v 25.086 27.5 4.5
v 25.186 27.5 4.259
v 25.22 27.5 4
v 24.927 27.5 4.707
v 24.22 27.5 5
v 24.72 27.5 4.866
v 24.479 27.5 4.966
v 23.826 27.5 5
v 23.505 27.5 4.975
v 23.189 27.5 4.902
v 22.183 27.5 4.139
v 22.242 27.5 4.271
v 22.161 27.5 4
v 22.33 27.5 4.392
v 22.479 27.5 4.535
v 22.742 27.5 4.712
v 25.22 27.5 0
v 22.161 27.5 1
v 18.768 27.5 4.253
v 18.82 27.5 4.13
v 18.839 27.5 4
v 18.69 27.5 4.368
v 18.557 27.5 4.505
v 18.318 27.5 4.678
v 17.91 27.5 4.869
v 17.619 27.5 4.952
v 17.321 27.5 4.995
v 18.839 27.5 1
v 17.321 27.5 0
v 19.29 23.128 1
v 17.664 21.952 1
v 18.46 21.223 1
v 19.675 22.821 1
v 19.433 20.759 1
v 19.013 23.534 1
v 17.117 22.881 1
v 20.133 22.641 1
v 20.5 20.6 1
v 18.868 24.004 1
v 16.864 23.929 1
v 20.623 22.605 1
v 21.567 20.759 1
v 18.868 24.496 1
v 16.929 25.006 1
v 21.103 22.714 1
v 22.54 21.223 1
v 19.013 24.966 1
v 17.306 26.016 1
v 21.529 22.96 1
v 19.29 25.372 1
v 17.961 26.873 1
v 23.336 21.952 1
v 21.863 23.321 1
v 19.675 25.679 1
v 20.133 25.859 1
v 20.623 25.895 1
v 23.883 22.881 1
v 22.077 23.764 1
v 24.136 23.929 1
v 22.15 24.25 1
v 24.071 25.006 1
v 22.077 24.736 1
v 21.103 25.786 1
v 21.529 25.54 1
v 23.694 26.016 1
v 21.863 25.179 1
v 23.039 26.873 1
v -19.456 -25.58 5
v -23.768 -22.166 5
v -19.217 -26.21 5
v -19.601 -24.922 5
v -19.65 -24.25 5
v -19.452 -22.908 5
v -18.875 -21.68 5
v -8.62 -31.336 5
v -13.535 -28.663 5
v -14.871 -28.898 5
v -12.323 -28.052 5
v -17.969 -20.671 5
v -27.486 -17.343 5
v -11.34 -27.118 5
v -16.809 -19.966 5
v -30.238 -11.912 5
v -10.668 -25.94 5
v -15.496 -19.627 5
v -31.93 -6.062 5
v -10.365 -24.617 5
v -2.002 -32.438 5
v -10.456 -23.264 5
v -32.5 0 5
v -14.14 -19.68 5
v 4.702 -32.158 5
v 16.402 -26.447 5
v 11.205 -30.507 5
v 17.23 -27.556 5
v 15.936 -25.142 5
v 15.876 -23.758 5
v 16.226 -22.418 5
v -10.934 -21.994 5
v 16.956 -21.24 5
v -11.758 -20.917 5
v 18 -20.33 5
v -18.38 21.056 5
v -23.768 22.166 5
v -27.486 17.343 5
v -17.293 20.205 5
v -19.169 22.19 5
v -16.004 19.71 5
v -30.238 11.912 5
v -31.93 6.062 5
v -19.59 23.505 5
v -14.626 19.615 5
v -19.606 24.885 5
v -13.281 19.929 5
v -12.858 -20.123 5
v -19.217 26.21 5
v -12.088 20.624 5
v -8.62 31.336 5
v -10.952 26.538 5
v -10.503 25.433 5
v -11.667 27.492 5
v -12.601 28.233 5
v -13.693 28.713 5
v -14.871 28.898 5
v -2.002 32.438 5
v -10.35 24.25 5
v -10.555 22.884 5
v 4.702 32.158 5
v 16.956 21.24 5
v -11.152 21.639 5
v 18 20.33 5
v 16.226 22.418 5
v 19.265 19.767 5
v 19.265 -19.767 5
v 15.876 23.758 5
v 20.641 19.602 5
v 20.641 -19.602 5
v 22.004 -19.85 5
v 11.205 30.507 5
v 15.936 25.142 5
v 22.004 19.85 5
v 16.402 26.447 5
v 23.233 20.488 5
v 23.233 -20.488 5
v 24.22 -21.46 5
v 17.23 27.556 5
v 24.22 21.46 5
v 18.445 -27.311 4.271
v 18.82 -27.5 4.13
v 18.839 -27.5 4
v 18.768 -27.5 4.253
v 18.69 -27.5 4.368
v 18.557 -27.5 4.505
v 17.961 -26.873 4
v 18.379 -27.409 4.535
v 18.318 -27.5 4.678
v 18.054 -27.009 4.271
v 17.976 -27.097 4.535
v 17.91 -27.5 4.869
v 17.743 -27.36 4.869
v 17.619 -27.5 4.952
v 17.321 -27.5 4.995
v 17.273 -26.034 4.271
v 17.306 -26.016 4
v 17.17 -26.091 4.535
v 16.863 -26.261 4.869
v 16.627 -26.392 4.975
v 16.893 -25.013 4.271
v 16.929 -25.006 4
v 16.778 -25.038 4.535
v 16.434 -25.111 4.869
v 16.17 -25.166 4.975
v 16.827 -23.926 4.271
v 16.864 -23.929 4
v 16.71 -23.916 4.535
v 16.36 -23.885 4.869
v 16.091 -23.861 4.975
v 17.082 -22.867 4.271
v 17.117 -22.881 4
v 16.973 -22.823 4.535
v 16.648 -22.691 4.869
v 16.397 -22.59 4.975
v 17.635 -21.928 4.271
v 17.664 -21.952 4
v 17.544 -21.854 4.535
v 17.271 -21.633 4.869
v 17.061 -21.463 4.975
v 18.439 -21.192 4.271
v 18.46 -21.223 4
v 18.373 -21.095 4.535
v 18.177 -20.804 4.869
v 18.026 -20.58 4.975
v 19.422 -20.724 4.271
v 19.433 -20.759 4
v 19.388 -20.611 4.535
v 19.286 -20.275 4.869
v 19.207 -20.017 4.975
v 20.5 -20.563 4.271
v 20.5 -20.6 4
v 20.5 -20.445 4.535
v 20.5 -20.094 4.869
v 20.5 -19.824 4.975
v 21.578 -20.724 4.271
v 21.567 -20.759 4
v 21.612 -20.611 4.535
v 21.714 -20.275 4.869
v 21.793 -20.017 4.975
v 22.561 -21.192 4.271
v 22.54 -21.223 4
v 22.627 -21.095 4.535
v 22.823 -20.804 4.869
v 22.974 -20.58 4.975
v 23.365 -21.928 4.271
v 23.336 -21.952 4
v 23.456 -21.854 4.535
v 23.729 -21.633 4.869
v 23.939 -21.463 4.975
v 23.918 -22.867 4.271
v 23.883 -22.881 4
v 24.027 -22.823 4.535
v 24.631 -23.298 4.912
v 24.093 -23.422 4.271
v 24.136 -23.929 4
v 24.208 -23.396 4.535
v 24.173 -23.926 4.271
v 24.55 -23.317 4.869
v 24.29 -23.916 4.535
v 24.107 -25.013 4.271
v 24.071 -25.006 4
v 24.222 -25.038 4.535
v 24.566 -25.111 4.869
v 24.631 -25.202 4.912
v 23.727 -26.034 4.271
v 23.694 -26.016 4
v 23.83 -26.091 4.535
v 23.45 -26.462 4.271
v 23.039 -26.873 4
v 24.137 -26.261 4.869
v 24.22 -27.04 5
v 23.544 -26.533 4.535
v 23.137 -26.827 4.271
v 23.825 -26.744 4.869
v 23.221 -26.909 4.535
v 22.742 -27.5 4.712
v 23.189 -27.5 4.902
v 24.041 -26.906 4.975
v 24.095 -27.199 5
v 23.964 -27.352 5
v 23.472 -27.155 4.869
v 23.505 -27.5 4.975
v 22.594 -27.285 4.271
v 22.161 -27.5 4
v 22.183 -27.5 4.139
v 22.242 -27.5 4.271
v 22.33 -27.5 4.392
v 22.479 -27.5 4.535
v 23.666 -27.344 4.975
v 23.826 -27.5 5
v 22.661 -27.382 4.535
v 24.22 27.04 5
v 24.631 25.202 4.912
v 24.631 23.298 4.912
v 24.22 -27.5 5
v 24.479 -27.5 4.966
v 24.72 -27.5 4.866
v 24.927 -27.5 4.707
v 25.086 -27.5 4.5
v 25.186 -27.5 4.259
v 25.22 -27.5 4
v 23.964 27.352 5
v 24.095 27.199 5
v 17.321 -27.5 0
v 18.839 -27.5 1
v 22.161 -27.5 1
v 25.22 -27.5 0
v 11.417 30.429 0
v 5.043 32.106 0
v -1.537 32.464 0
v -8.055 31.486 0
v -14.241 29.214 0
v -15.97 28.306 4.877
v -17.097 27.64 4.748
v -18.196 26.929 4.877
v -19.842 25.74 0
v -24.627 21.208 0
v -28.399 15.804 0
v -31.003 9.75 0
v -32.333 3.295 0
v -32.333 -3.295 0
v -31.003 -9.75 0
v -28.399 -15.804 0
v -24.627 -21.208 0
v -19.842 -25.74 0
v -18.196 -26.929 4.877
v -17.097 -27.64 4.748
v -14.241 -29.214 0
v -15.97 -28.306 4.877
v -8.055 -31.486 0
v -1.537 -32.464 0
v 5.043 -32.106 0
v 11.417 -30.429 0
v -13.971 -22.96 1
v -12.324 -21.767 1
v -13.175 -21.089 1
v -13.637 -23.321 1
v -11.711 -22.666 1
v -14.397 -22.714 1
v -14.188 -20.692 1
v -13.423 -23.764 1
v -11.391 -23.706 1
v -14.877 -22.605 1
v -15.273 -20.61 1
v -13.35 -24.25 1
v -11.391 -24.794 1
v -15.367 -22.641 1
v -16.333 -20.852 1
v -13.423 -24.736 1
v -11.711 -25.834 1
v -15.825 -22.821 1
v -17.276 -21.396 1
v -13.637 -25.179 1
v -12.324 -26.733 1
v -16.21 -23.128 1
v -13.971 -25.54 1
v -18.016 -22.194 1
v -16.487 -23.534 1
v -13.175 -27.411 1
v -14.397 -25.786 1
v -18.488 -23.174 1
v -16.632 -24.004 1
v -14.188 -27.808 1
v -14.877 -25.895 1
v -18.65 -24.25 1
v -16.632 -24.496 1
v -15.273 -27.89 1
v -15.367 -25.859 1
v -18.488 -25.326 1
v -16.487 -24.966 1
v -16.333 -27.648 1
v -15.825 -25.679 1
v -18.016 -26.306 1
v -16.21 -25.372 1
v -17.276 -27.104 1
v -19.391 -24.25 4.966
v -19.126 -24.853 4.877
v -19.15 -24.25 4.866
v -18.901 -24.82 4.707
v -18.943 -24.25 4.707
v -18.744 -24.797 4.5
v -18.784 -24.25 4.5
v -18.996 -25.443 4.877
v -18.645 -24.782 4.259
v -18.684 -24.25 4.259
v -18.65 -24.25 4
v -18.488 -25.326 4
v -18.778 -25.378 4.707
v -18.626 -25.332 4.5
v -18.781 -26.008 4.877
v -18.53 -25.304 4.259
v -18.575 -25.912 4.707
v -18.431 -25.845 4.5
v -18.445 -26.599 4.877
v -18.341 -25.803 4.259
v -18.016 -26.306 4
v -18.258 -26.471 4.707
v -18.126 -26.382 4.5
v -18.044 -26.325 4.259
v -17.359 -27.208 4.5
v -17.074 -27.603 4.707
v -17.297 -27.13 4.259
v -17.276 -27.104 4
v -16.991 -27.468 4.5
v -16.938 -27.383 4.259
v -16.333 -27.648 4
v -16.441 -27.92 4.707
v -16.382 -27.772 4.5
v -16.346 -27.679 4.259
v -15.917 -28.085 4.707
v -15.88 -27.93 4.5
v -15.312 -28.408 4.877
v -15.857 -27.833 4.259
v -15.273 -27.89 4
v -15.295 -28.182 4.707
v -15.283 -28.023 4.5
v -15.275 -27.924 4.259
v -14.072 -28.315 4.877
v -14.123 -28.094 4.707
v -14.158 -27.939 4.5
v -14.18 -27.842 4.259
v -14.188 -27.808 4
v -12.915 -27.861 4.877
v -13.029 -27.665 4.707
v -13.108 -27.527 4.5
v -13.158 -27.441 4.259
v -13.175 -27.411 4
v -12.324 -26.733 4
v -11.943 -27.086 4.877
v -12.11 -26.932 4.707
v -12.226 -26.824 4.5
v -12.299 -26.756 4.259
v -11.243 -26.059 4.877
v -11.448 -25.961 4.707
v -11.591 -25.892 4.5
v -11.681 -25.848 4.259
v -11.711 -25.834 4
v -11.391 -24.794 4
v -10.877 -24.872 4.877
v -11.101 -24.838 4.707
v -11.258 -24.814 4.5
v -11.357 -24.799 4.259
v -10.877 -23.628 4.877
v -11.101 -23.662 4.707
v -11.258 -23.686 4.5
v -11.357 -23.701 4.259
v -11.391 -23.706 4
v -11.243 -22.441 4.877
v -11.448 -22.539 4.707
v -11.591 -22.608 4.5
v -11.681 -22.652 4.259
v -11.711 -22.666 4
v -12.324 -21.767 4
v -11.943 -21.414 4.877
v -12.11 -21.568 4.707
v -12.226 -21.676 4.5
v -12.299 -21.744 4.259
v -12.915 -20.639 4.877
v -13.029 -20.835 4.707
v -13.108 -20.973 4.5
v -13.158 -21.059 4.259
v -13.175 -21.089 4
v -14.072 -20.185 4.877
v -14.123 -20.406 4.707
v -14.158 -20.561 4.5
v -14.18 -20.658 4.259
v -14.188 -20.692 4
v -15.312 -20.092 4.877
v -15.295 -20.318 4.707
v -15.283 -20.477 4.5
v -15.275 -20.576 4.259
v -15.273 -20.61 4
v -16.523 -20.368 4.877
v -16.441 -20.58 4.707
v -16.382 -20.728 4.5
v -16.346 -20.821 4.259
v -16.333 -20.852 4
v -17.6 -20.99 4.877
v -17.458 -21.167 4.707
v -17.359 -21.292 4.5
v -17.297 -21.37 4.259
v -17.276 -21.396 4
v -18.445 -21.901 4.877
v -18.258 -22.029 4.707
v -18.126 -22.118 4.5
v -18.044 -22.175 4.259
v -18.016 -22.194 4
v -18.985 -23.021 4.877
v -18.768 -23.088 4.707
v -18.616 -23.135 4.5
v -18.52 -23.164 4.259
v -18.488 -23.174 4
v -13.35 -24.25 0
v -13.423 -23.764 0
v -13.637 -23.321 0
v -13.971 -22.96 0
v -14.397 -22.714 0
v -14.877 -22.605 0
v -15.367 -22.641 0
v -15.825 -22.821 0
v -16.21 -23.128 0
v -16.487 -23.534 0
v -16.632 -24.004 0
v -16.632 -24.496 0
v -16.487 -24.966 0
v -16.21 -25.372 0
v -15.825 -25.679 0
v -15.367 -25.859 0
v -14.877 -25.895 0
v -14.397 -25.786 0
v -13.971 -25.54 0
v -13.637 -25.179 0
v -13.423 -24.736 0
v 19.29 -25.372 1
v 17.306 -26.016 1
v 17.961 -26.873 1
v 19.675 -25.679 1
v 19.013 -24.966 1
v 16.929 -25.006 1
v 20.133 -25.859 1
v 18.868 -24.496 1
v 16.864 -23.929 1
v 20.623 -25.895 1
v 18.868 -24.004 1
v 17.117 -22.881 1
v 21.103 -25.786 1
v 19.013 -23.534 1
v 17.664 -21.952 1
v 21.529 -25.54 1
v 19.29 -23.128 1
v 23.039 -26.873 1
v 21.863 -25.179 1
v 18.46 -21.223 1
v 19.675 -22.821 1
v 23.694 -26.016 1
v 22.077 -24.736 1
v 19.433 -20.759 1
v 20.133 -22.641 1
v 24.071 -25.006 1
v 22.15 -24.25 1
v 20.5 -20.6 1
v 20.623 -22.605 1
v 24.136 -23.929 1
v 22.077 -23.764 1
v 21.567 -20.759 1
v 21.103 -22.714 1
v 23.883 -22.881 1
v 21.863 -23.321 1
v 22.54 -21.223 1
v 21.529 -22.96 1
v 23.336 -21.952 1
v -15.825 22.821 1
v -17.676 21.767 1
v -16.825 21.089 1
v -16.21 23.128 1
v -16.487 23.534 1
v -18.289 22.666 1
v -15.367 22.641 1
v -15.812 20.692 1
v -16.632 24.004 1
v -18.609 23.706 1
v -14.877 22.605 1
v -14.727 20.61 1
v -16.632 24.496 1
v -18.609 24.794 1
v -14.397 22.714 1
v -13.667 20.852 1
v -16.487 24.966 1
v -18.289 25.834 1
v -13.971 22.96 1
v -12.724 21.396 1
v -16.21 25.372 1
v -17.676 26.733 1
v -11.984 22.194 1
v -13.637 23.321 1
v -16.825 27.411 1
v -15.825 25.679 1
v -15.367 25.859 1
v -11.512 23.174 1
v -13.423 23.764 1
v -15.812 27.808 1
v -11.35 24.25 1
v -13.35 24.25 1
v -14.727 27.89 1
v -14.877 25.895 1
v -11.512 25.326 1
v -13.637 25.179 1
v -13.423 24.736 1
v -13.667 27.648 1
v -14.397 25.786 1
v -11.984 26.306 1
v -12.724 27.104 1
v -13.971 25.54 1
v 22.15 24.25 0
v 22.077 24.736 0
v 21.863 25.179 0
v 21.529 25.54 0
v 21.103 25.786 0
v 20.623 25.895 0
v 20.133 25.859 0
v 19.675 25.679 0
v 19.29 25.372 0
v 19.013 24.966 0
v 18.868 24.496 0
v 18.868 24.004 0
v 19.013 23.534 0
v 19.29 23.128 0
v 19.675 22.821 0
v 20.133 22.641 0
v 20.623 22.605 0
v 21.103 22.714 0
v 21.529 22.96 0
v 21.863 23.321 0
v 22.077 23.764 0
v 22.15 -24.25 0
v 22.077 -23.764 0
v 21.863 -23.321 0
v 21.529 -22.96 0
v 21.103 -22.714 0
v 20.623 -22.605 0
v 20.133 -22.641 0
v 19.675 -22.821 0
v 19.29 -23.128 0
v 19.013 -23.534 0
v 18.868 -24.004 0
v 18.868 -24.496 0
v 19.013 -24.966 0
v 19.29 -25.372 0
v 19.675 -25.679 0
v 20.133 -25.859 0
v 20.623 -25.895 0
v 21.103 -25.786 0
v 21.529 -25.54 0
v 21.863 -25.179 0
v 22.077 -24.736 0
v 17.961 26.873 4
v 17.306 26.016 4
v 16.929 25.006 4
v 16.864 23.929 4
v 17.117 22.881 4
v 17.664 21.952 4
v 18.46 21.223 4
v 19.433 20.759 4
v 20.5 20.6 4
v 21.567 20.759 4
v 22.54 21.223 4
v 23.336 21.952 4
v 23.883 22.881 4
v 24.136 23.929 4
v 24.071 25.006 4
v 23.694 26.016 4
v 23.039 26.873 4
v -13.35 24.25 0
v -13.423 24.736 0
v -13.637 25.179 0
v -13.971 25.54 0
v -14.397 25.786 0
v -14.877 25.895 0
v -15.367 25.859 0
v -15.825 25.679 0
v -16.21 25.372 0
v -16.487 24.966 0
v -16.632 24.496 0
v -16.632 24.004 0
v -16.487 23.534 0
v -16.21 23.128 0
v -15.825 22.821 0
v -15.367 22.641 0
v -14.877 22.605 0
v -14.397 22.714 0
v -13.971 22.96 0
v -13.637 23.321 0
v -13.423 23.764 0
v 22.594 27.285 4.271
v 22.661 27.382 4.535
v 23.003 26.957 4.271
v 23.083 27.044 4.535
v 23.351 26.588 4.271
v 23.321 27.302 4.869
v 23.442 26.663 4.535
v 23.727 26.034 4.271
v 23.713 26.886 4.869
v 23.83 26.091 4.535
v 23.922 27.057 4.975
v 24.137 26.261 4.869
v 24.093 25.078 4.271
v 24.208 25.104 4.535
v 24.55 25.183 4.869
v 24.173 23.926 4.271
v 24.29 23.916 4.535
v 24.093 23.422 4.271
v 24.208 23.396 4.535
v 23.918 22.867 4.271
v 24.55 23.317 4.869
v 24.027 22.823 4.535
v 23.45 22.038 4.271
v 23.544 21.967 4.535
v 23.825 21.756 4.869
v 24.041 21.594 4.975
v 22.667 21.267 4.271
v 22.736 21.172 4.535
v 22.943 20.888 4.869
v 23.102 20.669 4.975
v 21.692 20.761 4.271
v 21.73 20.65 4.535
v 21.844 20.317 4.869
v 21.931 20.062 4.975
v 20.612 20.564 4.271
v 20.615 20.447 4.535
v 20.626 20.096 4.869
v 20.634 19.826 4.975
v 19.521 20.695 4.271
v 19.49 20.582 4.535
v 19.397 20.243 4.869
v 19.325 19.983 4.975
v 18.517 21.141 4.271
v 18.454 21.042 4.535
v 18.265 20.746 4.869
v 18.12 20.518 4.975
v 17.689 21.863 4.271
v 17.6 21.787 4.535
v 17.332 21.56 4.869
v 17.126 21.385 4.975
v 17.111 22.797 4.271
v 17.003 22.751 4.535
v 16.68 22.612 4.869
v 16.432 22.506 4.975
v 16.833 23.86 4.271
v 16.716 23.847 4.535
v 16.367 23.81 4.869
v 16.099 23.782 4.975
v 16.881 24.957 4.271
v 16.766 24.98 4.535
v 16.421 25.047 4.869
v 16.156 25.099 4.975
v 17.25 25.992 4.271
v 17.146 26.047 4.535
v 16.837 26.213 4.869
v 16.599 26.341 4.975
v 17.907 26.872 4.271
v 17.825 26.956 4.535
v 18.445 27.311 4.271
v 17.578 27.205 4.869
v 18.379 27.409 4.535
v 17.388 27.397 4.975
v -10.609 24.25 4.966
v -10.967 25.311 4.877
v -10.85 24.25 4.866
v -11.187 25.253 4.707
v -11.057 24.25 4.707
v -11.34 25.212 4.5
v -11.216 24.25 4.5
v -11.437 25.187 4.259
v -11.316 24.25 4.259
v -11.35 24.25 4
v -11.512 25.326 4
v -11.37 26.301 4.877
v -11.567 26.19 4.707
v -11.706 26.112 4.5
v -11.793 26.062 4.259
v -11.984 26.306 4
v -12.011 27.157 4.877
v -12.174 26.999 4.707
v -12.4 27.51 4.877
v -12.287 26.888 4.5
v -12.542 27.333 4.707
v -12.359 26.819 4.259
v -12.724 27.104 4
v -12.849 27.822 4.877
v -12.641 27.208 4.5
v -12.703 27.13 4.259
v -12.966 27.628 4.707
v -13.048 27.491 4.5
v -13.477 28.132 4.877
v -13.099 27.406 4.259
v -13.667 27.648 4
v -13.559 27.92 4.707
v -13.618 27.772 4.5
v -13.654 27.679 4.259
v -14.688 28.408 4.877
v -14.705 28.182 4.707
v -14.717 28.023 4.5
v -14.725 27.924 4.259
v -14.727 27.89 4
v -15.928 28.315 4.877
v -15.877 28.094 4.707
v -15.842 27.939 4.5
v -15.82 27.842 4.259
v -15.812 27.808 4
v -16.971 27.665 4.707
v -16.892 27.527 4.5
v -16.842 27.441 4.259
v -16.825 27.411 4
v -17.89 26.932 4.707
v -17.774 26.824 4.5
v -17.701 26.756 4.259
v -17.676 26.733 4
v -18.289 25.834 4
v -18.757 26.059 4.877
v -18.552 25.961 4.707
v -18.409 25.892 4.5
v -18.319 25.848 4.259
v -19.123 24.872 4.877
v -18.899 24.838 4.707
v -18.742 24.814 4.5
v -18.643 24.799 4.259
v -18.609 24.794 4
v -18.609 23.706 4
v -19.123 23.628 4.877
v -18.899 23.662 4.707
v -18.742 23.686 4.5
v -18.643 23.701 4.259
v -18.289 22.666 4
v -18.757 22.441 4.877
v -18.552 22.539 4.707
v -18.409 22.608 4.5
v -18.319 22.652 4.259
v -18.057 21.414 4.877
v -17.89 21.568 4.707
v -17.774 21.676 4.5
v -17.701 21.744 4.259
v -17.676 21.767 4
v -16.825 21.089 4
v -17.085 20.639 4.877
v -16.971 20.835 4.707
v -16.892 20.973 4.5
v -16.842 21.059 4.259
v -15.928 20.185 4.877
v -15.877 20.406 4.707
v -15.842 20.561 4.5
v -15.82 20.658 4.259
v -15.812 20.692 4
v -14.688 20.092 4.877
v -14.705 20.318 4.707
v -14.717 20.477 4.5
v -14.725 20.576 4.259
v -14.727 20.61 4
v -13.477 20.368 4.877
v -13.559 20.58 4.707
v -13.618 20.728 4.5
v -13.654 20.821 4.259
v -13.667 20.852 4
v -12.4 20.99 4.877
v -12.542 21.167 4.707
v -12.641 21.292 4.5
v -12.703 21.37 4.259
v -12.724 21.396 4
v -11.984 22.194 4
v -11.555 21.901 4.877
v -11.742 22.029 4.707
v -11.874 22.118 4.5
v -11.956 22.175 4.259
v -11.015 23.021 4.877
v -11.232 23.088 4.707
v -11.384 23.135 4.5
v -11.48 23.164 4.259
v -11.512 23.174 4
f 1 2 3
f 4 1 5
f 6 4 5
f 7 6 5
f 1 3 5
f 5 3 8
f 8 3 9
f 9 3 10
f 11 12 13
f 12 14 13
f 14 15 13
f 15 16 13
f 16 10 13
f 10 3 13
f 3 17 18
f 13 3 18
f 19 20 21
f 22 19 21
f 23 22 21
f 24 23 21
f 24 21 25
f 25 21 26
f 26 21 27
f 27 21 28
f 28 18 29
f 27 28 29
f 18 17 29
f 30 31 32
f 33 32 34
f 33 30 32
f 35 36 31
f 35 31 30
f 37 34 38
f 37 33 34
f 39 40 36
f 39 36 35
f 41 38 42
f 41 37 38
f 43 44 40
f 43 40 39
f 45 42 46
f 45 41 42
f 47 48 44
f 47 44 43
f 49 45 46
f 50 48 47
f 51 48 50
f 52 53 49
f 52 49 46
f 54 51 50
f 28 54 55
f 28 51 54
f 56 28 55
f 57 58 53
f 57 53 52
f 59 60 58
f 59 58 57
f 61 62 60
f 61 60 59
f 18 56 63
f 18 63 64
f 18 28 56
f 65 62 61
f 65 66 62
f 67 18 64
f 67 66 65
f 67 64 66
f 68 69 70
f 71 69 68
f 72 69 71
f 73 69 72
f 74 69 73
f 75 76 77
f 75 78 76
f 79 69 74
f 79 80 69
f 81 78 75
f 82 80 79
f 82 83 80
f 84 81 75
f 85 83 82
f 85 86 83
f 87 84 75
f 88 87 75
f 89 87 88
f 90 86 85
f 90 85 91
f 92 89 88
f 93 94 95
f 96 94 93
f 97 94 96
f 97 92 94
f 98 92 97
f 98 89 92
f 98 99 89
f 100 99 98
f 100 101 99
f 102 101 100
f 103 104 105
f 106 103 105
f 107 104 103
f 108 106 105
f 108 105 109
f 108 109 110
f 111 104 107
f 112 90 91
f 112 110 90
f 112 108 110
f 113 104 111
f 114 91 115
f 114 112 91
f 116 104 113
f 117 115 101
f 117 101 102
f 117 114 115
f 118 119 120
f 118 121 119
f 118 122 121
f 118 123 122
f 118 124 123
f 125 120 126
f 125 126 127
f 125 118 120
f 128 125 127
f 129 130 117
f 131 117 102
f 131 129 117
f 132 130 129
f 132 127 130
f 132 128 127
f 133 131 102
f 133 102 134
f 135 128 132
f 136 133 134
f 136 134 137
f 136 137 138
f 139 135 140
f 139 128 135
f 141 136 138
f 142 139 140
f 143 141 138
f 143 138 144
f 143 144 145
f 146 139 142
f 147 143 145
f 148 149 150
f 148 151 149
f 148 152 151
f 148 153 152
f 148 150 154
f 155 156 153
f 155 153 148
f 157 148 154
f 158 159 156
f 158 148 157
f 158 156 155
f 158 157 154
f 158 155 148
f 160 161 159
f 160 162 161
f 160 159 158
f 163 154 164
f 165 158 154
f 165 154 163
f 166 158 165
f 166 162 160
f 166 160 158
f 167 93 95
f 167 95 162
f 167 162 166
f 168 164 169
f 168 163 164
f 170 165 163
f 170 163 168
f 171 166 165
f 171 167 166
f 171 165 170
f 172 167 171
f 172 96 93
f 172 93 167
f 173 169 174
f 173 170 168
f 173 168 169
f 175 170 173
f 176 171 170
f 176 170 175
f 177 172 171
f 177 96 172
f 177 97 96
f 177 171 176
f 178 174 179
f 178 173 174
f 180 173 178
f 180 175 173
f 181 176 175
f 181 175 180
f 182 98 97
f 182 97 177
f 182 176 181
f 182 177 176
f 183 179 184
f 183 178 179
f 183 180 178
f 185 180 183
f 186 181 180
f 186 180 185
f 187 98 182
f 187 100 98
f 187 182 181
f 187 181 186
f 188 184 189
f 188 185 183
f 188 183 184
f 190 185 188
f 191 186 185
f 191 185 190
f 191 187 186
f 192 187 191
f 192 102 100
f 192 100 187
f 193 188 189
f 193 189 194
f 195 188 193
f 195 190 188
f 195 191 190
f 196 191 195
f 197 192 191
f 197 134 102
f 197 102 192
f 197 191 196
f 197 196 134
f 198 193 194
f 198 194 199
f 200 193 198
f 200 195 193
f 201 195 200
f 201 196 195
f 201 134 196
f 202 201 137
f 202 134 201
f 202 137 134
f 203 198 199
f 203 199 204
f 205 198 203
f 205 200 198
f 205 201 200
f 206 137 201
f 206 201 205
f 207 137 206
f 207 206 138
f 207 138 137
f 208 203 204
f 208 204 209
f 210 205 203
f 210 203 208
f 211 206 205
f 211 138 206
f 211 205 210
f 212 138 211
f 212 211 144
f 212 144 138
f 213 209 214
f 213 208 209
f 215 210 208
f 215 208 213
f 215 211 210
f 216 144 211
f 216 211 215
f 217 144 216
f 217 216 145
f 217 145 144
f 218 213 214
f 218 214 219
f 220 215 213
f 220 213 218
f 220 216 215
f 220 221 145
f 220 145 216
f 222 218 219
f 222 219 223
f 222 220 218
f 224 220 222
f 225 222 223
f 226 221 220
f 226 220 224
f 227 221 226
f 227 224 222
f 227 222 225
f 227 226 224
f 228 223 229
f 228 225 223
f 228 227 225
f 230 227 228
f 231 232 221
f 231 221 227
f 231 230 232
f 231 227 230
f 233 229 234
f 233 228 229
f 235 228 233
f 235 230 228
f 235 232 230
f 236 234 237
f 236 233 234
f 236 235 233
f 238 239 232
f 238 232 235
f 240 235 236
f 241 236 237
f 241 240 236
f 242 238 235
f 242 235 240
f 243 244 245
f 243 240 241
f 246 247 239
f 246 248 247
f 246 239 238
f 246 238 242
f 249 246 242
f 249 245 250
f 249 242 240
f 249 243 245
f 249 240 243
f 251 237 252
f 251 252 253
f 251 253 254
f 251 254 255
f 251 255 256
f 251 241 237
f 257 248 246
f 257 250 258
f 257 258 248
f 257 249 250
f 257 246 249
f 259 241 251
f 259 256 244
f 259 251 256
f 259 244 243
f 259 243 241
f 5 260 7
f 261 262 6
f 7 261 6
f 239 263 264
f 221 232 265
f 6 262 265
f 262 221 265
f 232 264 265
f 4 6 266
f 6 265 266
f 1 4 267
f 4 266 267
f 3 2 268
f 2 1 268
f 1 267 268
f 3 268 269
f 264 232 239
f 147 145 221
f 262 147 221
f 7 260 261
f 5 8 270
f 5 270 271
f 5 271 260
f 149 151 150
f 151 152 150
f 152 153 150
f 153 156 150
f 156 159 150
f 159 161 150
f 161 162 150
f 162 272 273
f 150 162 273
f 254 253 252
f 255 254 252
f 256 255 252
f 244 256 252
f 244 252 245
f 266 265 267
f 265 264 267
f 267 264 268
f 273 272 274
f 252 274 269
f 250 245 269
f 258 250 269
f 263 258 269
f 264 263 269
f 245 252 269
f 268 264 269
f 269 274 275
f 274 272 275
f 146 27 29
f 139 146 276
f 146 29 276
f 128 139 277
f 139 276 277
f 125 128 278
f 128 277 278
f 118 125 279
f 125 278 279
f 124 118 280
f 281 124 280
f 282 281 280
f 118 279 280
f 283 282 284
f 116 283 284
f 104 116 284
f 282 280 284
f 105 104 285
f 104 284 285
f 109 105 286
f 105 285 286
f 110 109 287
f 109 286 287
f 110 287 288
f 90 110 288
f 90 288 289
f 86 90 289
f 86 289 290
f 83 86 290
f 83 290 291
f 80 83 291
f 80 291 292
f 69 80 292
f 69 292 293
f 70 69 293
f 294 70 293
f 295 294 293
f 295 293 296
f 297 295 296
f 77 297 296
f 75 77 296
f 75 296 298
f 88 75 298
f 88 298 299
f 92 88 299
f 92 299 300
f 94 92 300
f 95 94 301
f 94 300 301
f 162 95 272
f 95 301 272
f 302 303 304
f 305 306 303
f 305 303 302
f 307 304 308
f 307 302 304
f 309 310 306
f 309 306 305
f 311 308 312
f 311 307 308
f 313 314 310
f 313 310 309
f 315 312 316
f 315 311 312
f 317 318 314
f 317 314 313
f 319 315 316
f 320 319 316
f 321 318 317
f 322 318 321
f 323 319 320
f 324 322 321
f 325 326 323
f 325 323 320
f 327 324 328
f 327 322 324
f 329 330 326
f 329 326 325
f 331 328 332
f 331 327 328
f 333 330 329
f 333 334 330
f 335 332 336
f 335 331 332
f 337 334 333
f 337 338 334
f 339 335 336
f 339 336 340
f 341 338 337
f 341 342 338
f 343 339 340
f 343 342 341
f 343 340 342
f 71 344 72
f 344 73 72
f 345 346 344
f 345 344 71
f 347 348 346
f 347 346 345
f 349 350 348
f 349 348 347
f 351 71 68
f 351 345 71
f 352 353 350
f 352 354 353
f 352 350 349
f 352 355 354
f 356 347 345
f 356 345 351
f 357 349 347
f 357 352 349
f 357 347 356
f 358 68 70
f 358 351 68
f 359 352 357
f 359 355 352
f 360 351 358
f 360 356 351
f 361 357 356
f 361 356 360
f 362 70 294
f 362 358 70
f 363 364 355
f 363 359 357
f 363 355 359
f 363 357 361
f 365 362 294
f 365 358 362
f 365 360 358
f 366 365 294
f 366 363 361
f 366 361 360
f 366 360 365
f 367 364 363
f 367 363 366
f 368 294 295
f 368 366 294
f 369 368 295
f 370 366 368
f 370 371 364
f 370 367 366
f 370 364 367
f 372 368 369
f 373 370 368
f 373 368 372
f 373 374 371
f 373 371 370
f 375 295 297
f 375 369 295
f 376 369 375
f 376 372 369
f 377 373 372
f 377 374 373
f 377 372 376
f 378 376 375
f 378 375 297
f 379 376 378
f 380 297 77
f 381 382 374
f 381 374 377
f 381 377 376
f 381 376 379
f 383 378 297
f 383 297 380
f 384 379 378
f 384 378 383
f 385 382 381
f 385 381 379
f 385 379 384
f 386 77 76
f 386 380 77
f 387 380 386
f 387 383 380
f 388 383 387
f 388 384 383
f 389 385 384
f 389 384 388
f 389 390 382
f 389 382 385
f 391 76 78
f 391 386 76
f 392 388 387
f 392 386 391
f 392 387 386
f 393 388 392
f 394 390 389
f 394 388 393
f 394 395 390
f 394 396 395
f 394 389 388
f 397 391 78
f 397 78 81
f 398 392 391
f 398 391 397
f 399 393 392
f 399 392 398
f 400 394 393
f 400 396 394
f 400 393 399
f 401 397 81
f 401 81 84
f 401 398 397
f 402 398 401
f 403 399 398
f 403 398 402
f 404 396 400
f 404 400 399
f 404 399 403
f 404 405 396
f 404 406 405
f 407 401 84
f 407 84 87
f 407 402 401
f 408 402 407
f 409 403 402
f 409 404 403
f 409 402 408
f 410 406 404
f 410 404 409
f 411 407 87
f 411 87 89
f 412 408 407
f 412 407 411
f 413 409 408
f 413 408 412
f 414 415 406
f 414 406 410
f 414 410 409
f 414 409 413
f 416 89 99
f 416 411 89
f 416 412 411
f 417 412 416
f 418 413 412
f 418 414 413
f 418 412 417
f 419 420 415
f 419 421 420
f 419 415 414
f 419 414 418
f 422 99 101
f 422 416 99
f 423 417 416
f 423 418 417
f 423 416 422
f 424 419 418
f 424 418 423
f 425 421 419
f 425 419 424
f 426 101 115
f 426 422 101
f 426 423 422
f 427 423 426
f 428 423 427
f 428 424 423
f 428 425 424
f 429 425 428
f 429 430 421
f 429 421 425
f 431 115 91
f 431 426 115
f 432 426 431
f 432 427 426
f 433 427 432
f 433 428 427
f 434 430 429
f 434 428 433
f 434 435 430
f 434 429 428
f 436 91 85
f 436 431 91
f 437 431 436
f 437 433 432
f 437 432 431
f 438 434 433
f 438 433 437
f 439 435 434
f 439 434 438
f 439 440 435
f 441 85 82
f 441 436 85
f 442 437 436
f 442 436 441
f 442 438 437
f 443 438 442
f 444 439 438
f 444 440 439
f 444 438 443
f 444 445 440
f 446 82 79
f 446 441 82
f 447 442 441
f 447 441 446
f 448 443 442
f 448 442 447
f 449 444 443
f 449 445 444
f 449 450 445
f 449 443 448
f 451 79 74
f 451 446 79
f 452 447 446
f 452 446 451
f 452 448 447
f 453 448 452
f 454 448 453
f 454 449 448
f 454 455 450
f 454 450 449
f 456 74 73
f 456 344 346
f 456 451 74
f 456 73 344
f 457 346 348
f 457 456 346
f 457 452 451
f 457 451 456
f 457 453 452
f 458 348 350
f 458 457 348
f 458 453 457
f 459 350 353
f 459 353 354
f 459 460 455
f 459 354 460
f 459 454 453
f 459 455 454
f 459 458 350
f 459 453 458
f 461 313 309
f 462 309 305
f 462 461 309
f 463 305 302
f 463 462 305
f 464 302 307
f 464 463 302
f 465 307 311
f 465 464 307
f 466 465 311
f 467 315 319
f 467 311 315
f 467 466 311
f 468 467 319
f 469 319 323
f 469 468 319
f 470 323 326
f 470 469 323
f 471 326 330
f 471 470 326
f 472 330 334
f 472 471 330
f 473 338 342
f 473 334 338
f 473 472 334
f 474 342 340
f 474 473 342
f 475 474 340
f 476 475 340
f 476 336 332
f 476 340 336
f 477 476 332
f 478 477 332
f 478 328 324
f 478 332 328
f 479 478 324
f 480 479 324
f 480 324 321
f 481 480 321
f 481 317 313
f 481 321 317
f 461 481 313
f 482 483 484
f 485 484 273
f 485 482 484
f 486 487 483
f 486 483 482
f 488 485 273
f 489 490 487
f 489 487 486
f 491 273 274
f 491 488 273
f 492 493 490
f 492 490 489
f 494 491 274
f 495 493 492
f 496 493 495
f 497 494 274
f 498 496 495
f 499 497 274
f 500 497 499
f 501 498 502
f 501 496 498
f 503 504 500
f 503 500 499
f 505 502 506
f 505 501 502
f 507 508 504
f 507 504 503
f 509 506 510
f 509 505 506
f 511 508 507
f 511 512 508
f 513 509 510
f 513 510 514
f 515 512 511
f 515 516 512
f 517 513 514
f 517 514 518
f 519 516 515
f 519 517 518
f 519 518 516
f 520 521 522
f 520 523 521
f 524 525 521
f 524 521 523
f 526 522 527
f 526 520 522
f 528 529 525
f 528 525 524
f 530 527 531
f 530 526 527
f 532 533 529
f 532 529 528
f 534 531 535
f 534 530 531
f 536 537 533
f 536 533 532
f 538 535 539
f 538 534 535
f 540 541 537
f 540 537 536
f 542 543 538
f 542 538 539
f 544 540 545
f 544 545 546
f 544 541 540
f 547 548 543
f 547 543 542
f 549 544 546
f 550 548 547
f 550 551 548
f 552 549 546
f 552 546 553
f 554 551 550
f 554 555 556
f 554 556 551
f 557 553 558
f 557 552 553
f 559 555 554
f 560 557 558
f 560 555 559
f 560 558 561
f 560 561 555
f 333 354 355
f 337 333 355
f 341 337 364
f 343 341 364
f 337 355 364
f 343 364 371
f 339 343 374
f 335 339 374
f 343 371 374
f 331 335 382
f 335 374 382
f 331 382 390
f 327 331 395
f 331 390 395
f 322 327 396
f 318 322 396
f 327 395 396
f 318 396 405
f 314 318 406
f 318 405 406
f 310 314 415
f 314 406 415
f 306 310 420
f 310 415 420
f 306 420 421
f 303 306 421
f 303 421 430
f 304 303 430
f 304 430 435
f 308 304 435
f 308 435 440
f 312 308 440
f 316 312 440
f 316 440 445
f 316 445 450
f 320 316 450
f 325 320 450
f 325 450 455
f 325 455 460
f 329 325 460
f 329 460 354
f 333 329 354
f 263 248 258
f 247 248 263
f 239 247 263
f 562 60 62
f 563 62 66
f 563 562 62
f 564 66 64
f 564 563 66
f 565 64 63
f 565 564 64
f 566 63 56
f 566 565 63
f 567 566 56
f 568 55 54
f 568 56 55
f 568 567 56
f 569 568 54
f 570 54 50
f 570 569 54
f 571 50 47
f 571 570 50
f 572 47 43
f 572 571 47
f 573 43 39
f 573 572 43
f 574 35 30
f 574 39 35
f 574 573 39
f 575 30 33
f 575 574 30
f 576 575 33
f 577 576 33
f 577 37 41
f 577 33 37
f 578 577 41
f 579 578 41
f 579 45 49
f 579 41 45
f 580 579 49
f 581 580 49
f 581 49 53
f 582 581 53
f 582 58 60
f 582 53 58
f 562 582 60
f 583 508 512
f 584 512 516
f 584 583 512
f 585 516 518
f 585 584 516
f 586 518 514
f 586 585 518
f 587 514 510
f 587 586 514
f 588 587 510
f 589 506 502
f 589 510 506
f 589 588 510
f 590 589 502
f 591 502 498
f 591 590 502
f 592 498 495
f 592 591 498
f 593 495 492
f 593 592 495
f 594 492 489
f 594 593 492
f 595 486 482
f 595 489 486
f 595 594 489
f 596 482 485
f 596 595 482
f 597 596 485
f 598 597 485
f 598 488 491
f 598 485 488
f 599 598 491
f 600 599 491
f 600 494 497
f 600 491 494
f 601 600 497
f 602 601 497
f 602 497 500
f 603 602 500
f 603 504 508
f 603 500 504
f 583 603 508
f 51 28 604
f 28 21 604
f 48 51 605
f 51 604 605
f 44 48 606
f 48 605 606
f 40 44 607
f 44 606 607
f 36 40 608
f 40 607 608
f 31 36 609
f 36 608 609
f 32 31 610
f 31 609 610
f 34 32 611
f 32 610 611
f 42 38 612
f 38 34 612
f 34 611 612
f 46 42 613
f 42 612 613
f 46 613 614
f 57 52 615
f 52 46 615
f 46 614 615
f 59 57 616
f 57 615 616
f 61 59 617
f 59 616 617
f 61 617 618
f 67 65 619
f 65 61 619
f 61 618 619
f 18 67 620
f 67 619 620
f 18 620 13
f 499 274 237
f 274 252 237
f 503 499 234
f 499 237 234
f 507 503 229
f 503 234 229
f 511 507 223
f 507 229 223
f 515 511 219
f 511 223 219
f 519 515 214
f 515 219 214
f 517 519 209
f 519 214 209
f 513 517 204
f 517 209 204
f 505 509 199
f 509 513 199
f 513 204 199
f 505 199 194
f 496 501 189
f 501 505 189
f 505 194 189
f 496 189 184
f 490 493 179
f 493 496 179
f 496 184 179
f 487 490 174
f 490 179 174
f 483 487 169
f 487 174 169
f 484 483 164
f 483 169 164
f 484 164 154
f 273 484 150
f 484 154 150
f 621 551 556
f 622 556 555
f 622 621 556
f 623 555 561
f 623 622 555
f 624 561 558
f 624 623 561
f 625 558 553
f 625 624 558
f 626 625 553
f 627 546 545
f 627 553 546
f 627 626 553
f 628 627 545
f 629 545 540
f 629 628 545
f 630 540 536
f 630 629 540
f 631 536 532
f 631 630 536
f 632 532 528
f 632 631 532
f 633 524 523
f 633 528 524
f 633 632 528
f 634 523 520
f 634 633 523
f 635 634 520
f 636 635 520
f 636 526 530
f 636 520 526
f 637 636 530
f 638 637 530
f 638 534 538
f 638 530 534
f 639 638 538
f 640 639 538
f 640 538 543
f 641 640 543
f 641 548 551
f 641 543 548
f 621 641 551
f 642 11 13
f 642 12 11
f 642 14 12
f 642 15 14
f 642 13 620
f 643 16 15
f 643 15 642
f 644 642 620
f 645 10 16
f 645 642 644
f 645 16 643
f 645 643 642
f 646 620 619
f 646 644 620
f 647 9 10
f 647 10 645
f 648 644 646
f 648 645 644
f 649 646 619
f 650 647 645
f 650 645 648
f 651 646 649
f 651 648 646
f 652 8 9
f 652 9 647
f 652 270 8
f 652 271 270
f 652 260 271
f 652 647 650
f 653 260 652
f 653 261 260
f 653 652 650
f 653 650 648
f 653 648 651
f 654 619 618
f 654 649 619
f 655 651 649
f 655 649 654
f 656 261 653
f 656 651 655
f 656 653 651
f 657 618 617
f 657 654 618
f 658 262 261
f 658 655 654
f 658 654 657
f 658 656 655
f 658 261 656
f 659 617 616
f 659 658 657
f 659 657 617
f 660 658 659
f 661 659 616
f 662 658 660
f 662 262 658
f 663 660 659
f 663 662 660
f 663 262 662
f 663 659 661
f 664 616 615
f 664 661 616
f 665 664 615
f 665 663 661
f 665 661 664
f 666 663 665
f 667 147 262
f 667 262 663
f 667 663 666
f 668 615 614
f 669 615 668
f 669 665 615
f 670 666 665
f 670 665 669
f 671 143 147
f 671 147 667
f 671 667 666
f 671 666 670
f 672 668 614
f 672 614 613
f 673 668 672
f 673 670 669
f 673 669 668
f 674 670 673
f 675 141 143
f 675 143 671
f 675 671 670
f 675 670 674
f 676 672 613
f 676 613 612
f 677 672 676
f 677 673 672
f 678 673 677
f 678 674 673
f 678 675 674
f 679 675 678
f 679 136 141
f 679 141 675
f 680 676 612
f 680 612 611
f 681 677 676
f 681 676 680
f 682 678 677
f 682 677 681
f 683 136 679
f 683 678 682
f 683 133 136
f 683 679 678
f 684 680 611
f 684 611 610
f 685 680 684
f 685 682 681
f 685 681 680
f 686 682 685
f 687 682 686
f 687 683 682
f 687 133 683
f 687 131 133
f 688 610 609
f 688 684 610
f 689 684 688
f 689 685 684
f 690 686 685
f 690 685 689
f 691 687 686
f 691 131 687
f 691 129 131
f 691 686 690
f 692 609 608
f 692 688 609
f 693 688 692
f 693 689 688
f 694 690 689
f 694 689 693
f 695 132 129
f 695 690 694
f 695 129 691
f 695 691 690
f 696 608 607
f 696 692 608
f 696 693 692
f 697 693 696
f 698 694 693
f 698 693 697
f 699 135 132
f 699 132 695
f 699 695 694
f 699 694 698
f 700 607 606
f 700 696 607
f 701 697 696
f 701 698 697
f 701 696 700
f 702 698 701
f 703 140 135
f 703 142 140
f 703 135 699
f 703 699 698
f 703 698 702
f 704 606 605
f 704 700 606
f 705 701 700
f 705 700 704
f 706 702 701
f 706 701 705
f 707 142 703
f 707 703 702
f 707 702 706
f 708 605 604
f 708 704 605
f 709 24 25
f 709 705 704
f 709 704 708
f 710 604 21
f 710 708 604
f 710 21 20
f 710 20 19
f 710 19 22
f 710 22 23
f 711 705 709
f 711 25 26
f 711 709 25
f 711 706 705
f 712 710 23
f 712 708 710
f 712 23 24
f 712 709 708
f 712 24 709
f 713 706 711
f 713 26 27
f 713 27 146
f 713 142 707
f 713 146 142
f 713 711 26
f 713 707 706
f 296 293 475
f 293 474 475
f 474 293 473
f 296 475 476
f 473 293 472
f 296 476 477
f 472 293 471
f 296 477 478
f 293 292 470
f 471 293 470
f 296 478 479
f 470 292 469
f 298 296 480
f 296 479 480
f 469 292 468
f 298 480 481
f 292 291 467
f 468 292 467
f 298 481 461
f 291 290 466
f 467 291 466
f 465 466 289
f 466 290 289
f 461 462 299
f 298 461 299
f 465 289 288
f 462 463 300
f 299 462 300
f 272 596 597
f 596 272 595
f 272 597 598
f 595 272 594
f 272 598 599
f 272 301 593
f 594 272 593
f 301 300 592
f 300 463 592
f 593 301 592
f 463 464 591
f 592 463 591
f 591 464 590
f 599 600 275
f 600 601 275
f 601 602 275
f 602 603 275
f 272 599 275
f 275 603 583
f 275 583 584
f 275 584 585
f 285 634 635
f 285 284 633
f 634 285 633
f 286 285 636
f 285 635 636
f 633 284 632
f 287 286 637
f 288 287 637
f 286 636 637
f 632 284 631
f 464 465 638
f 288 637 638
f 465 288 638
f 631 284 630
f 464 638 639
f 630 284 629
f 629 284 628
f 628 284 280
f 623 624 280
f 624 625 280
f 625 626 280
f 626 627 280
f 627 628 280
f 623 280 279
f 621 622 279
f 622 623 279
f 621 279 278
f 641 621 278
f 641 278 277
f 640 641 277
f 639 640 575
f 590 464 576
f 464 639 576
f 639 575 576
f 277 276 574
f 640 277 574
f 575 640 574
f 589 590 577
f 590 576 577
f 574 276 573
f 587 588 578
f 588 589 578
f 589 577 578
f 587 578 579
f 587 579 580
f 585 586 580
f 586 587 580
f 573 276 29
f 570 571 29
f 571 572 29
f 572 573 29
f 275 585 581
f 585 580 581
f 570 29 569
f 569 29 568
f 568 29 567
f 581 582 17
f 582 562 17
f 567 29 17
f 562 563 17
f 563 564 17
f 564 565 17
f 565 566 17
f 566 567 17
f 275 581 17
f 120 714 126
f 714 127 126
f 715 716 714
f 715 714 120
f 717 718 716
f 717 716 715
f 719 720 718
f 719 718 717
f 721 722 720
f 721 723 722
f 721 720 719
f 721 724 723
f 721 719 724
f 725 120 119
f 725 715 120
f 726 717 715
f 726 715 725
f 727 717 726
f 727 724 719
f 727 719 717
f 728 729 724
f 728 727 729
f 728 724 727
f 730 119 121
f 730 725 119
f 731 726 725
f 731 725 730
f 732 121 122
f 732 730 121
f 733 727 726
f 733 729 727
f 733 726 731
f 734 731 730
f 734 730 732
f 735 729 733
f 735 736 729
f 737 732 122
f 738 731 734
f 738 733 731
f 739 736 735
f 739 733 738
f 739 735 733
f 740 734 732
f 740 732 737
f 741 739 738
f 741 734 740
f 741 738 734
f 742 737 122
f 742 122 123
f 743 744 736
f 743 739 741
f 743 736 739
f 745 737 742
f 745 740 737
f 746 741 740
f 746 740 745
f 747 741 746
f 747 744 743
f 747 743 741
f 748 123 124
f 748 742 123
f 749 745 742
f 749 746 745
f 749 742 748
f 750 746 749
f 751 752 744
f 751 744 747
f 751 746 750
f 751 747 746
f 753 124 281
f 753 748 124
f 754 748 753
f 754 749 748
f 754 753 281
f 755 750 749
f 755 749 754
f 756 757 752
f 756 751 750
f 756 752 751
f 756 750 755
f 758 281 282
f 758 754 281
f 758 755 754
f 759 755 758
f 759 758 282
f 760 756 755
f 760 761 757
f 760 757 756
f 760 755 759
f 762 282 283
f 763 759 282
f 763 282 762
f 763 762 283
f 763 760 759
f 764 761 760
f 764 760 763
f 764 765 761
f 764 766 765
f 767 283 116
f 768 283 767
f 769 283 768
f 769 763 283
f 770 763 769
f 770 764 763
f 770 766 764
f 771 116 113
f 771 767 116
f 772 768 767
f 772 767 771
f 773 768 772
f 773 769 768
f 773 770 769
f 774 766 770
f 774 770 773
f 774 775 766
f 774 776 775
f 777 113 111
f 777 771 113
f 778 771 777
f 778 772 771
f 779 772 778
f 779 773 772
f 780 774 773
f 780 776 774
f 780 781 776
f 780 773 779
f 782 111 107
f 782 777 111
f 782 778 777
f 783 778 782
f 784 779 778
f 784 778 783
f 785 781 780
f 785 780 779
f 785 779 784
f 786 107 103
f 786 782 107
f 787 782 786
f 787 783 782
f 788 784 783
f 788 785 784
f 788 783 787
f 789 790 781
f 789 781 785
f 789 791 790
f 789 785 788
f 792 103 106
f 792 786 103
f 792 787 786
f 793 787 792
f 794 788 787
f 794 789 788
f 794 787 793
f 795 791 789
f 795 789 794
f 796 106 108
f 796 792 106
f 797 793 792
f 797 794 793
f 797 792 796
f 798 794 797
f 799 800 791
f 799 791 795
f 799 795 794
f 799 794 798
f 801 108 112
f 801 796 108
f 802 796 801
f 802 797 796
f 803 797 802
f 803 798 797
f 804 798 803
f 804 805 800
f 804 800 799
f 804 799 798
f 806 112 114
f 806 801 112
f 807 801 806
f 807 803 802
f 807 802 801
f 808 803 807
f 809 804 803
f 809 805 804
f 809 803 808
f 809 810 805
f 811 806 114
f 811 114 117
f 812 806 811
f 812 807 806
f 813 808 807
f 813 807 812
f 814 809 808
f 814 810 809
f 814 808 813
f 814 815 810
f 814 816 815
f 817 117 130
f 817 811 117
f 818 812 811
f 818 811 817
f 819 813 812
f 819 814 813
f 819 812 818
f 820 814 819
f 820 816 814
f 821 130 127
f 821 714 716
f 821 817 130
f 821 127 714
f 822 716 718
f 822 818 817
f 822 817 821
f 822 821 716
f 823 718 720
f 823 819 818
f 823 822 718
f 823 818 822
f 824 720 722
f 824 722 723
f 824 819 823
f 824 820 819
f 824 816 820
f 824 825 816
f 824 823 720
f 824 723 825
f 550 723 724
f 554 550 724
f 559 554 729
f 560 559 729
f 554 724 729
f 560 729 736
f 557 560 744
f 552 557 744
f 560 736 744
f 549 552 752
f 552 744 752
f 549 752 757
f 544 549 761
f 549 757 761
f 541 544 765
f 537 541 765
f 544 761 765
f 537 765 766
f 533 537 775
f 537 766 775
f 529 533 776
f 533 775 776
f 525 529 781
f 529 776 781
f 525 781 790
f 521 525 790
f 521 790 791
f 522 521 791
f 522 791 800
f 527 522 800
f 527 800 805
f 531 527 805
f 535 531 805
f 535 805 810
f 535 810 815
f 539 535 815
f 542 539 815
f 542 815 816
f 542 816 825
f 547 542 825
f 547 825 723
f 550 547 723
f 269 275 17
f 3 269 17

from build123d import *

# Parameters (mm, degrees)
SKIZZE1_R                       = 1.65
AUFSATZ_LINEAR_AUSTRAGEN1_DEPTH = 5
SKIZZE2_R                       = 3.65
SCHNITT_LINEAR_AUSTRAGEN1_DEPTH = 4
VERRUNDUNG10_R                  = 1


with BuildPart() as part:
    # Skizze1 → Aufsatz-Linear austragen1 (new body)
    with BuildSketch(Plane.XY):
        with BuildLine():
            Line((25.22, 27.5), (17.320508076, 27.5))
            ThreePointArc((17.320508076, 27.5), (-32.5, 0), (17.320508076, -27.5))
            Line((17.320508076, -27.5), (25.22, -27.5))
            Line((25.22, -27.5), (25.22, 27.5))
        make_face()
        with Locations((20.5, -24.25)):
            Circle(SKIZZE1_R, mode=Mode.SUBTRACT)
        with Locations((20.5, 24.25)):
            Circle(SKIZZE1_R, mode=Mode.SUBTRACT)
        with Locations((-15, -24.25)):
            Circle(SKIZZE1_R, mode=Mode.SUBTRACT)
        with Locations((-15, 24.25)):
            Circle(SKIZZE1_R, mode=Mode.SUBTRACT)
    extrude(amount=AUFSATZ_LINEAR_AUSTRAGEN1_DEPTH)

    # Skizze2 → Schnitt-Linear austragen1 (cut)
    with BuildSketch(Plane.XY.offset(5)):
        with Locations((-15, 24.25)):
            Circle(SKIZZE2_R)
        with Locations((20.5, 24.25)):
            Circle(SKIZZE2_R)
        with Locations((20.5, -24.25)):
            Circle(SKIZZE2_R)
        with Locations(Location((-15, -24.25, 0), (0, 0, 180))):
            Circle(SKIZZE2_R)
    extrude(amount=-SCHNITT_LINEAR_AUSTRAGEN1_DEPTH, mode=Mode.SUBTRACT)

    # Verrundung10
    # the kernel refuses this fillet: 1 mm, written as the material it takes off along each edge
    with BuildSketch(Plane(origin=(25.22, -30, 5), x_dir=(-1, 0, 0), z_dir=(0, 1, 0))) as verrundung10_piece_1:
        with BuildLine():
            CenterArc((VERRUNDUNG10_R, -VERRUNDUNG10_R), VERRUNDUNG10_R, 90, 90)
            Line((0, -VERRUNDUNG10_R), (0, 0))
            Line((0, 0), (VERRUNDUNG10_R, 0))
        make_face()
    extrude(amount=60, mode=Mode.SUBTRACT)
    with BuildSketch(Plane(origin=(20.5, 24.25, 5), x_dir=(0.0031415874858533787, 0.9999950652018582, 0), z_dir=(-0.9999950652018582, 0.0031415874858533787, 0))) as verrundung10_piece_2:
        with BuildLine():
            CenterArc((3.65 + VERRUNDUNG10_R, VERRUNDUNG10_R), VERRUNDUNG10_R, 180, 90)
            Line((3.65 + VERRUNDUNG10_R, 0), (3.65, 0))
            Line((3.65, 0), (3.65, VERRUNDUNG10_R))
        make_face()
    revolve(axis=Axis((20.5, 24.25, 5), (0, 0, -1)), revolution_arc=359.64, mode=Mode.SUBTRACT)
    with BuildSketch(Plane(origin=(20.5, -24.25, 5), x_dir=(-0.0031415874859059387, -0.999995065201858, 0), z_dir=(0.999995065201858, -0.0031415874859059387, 0))) as verrundung10_piece_3:
        with BuildLine():
            CenterArc((3.65 + VERRUNDUNG10_R, VERRUNDUNG10_R), VERRUNDUNG10_R, 180, 90)
            Line((3.65 + VERRUNDUNG10_R, 0), (3.65, 0))
            Line((3.65, 0), (3.65, VERRUNDUNG10_R))
        make_face()
    revolve(axis=Axis((20.5, -24.25, 5), (0, 0, -1)), revolution_arc=359.64, mode=Mode.SUBTRACT)
    with BuildSketch(Plane(origin=(-15, -24.25, 5), x_dir=(-1, 0, 0), z_dir=(0, 1, 0))) as verrundung10_piece_4:
        with BuildLine():
            CenterArc((3.65 + VERRUNDUNG10_R, -VERRUNDUNG10_R), VERRUNDUNG10_R, 90, 90)
            Line((3.65, -VERRUNDUNG10_R), (3.65, 0))
            Line((3.65, 0), (3.65 + VERRUNDUNG10_R, 0))
        make_face()
    revolve(axis=Axis((-15, -24.25, 5), (0, 0, 1)), mode=Mode.SUBTRACT)
    with BuildSketch(Plane(origin=(-15, 24.25, 5), x_dir=(1, 0, 0), z_dir=(0, -1, 0))) as verrundung10_piece_5:
        with BuildLine():
            CenterArc((3.65 + VERRUNDUNG10_R, -VERRUNDUNG10_R), VERRUNDUNG10_R, 90, 90)
            Line((3.65, -VERRUNDUNG10_R), (3.65, 0))
            Line((3.65, 0), (3.65 + VERRUNDUNG10_R, 0))
        make_face()
    revolve(axis=Axis((-15, 24.25, 5), (0, 0, 1)), mode=Mode.SUBTRACT)


solid = part.part
